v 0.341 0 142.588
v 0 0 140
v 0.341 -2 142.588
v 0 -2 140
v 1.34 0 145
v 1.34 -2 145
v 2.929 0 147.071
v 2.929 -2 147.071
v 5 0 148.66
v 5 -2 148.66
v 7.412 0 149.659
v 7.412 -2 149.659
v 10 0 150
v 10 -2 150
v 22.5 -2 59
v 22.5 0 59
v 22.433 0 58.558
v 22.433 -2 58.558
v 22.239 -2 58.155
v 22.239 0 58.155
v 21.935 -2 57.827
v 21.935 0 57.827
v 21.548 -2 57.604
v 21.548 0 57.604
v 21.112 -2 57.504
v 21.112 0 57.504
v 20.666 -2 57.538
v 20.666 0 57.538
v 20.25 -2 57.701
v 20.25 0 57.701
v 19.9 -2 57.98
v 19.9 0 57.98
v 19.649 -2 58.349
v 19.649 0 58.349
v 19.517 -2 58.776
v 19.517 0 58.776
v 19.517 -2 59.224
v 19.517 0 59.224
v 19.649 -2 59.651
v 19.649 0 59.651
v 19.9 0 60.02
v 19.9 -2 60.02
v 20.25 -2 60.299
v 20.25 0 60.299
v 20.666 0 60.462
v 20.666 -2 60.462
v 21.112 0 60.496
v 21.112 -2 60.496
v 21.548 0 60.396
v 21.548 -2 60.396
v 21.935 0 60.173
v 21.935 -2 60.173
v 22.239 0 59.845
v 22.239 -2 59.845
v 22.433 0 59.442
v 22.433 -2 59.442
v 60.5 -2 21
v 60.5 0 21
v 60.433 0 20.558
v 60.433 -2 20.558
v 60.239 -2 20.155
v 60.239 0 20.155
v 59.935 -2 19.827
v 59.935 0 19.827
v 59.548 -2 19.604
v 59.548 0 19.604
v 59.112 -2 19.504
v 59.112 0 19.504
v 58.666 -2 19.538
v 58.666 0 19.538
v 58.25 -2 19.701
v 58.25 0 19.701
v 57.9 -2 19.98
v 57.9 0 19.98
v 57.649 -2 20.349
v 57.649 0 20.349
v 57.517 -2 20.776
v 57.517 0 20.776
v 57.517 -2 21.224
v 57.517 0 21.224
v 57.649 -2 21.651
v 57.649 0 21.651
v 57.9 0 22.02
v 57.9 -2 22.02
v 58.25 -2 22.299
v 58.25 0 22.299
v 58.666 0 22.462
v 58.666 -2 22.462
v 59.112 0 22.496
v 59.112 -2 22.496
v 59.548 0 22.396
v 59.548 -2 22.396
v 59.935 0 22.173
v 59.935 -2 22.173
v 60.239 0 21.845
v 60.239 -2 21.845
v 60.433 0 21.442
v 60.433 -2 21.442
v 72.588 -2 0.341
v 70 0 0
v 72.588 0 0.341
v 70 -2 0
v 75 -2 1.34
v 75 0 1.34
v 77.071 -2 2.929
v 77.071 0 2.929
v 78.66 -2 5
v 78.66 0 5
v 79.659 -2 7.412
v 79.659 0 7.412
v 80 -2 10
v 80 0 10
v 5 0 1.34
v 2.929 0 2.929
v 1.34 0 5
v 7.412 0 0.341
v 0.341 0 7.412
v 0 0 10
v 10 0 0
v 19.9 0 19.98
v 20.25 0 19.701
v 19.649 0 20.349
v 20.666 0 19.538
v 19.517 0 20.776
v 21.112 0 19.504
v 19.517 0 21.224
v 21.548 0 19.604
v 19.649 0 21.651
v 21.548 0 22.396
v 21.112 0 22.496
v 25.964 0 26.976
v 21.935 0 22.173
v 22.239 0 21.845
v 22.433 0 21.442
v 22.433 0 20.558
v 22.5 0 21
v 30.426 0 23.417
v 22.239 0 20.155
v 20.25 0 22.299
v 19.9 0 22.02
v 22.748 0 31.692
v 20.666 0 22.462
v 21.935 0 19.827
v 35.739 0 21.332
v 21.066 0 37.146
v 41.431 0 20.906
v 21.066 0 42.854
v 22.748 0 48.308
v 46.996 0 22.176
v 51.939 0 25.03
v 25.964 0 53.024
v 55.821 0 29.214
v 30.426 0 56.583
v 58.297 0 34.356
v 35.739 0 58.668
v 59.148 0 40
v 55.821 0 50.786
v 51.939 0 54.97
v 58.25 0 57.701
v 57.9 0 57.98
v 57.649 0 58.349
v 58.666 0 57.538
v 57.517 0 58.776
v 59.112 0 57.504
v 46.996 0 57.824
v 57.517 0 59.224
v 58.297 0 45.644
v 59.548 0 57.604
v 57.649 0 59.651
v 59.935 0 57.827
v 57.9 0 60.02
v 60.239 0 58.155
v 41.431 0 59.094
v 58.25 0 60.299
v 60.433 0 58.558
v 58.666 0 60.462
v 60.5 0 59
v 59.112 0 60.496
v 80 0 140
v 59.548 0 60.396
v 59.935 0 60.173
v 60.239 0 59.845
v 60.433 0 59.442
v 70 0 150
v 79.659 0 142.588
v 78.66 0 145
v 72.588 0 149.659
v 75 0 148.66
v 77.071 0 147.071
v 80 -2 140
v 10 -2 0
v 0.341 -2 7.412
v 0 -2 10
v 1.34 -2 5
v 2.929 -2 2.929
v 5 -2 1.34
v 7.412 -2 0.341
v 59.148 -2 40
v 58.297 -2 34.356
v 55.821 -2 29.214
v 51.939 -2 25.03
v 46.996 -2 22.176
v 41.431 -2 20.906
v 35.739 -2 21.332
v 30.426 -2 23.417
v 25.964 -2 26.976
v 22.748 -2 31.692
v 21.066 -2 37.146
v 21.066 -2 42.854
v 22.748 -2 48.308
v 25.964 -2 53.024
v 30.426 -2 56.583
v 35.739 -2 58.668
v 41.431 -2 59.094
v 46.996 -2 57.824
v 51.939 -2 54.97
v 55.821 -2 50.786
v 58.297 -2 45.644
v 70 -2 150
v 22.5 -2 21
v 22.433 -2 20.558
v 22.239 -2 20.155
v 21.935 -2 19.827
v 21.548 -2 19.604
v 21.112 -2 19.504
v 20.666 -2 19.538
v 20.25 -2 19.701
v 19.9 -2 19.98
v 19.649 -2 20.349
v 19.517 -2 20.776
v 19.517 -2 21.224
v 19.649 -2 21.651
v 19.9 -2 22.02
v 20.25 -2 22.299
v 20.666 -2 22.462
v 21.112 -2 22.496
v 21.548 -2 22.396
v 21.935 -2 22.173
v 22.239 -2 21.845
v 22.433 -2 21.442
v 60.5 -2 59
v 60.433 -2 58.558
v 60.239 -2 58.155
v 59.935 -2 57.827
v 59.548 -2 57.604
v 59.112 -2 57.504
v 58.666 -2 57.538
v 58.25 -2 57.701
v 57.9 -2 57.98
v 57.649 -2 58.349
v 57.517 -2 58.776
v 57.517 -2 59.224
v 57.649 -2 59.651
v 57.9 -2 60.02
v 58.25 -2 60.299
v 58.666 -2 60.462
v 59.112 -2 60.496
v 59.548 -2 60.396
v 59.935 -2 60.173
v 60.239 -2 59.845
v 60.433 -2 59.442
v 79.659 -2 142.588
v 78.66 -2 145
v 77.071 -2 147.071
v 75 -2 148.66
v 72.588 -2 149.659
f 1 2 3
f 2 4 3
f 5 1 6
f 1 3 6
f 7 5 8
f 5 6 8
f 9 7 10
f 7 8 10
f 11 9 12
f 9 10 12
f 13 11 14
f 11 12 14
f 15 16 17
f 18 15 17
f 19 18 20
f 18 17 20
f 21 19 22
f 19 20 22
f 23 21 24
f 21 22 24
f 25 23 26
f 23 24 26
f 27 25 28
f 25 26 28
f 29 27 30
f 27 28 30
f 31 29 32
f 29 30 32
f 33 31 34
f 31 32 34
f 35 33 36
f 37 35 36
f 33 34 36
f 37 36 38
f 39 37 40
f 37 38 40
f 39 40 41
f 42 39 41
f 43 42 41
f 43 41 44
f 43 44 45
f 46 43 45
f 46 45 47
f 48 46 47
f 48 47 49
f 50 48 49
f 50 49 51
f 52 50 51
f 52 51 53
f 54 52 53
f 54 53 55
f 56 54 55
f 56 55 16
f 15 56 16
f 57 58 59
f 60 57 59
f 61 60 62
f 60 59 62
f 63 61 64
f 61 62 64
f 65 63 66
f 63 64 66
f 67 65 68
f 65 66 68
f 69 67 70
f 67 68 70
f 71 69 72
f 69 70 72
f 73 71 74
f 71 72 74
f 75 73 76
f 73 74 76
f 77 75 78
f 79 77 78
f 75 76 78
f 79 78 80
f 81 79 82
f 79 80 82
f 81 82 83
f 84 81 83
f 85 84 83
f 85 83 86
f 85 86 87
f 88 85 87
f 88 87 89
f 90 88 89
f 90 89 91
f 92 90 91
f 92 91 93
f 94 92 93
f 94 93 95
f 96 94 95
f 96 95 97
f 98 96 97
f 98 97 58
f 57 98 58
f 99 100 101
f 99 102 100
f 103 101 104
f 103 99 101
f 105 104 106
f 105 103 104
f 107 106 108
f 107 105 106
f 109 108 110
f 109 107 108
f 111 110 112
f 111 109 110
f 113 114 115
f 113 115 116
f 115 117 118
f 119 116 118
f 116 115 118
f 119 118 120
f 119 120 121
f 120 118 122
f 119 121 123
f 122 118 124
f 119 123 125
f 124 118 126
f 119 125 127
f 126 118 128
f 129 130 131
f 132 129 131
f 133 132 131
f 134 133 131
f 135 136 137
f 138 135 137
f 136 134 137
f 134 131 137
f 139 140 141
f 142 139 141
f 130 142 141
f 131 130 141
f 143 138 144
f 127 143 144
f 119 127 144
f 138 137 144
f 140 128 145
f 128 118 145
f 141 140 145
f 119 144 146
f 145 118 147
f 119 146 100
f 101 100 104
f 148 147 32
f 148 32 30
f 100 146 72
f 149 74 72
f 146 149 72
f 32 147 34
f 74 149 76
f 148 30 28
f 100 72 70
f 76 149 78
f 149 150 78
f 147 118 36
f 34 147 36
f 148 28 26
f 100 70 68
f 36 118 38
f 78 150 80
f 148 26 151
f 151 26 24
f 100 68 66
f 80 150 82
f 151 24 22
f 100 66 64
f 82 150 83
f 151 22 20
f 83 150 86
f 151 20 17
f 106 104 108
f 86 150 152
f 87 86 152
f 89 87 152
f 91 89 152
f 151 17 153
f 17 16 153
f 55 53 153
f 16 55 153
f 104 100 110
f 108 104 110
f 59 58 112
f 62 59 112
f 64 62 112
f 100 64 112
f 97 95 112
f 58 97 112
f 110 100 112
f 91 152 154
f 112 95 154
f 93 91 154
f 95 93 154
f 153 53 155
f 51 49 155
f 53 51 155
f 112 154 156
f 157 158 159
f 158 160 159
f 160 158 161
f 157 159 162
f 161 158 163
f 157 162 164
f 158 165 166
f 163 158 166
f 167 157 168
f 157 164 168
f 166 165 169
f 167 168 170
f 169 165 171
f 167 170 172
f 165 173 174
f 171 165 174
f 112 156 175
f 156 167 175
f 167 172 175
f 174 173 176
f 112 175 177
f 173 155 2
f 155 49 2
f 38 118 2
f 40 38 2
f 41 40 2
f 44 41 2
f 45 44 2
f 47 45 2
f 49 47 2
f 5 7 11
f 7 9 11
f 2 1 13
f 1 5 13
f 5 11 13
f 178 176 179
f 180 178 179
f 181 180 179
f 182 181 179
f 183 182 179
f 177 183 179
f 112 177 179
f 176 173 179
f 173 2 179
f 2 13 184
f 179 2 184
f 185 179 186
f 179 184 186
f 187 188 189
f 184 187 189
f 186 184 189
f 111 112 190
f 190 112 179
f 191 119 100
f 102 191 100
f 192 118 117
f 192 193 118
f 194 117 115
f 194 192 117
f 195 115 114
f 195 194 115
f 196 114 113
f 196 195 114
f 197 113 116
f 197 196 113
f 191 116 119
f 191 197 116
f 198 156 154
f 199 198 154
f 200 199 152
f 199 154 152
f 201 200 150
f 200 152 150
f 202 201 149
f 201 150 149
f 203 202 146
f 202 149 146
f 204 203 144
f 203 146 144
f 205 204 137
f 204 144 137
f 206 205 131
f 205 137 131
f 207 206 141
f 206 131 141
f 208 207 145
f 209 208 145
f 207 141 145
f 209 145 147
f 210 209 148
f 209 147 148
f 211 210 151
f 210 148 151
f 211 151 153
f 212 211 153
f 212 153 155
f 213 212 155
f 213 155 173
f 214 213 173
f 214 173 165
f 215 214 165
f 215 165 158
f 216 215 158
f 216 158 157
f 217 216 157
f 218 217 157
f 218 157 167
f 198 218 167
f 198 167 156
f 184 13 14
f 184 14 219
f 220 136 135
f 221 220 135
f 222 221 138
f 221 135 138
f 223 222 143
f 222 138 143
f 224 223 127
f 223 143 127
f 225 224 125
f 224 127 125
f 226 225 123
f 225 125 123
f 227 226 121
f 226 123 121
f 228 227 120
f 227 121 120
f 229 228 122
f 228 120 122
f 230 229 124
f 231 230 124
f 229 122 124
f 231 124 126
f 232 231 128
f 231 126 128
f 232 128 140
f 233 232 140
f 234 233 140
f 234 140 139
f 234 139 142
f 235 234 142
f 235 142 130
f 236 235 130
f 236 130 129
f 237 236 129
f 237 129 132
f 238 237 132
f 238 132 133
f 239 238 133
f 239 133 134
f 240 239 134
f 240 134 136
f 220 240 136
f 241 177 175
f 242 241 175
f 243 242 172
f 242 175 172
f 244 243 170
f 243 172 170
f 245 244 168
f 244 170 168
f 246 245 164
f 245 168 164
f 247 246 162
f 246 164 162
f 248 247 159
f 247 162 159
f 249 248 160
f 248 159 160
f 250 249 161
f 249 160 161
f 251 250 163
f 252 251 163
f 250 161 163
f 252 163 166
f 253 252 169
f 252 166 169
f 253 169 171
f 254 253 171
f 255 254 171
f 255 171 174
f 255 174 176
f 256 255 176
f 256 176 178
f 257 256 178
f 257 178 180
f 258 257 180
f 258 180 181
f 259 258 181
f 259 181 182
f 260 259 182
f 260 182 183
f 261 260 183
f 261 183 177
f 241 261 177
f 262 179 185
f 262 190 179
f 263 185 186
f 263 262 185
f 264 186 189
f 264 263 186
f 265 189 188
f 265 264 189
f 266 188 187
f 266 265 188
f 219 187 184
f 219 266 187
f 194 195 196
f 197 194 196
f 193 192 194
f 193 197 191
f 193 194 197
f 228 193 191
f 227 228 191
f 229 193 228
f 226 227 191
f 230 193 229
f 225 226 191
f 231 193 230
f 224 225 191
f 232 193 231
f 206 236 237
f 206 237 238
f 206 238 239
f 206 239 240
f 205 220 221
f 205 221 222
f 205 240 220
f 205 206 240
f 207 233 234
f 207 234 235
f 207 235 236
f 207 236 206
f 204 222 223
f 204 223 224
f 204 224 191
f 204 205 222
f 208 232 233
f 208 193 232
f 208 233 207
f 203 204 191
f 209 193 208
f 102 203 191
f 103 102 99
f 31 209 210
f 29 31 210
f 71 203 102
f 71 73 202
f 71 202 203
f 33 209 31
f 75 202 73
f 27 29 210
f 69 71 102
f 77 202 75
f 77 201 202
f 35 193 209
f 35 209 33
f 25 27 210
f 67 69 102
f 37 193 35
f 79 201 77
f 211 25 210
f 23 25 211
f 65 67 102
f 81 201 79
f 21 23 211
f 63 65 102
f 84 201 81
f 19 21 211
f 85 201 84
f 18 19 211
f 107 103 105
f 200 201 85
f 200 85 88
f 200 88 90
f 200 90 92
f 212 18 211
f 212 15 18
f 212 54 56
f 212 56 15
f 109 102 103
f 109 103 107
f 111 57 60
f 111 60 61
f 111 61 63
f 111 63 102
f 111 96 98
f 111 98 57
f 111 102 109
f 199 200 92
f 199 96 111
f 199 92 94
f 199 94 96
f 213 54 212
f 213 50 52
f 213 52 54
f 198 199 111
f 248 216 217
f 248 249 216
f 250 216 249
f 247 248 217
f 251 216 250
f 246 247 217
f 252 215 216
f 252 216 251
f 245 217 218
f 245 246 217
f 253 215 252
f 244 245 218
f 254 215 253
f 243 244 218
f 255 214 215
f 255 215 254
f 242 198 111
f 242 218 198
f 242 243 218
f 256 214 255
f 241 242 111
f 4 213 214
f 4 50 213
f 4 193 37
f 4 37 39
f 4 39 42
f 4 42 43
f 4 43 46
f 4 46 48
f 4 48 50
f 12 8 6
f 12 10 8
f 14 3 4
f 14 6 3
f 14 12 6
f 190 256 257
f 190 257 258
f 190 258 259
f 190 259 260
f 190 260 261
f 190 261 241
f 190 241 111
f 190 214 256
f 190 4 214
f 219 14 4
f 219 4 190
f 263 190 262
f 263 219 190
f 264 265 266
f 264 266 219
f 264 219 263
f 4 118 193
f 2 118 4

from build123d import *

# Parameters (mm, degrees)
SKETCH_W      = 80
SKETCH_H      = 150
PAD_DEPTH     = 2
FILLET_R      = 10
SKETCH001_R   = 19.147904
SKETCH001_R_2 = 1.5
POCKET_DEPTH  = 5


with BuildPart() as part:
    # Sketch → Pad (new body)
    with BuildSketch(Plane.XZ):
        with Locations((40, 75)):
            Rectangle(SKETCH_W, SKETCH_H)
    extrude(amount=PAD_DEPTH)

    # Fillet
    fillet_edges = [part.edges().sort_by_distance(p)[0] for p in [
        (0, -1, 0),
        (0, -1, 150),
        (80, -1, 150),
        (80, -1, 0),
    ]]
    fillet(fillet_edges, radius=FILLET_R)

    # Sketch001 (on Face2 of Fillet) → Pocket (cut)
    with BuildSketch(Plane(origin=(0, 0, 0), x_dir=(1, 0, 0), z_dir=(0, 1, 0))):
        with Locations((40, -40)):
            Circle(SKETCH001_R)
        with Locations((21, -21)):
            Circle(SKETCH001_R_2)
        with Locations((59, -21)):
            Circle(SKETCH001_R_2)
        with Locations((59, -59)):
            Circle(SKETCH001_R_2)
        with Locations((21, -59)):
            Circle(SKETCH001_R_2)
    extrude(amount=-POCKET_DEPTH, mode=Mode.SUBTRACT)


solid = part.part
